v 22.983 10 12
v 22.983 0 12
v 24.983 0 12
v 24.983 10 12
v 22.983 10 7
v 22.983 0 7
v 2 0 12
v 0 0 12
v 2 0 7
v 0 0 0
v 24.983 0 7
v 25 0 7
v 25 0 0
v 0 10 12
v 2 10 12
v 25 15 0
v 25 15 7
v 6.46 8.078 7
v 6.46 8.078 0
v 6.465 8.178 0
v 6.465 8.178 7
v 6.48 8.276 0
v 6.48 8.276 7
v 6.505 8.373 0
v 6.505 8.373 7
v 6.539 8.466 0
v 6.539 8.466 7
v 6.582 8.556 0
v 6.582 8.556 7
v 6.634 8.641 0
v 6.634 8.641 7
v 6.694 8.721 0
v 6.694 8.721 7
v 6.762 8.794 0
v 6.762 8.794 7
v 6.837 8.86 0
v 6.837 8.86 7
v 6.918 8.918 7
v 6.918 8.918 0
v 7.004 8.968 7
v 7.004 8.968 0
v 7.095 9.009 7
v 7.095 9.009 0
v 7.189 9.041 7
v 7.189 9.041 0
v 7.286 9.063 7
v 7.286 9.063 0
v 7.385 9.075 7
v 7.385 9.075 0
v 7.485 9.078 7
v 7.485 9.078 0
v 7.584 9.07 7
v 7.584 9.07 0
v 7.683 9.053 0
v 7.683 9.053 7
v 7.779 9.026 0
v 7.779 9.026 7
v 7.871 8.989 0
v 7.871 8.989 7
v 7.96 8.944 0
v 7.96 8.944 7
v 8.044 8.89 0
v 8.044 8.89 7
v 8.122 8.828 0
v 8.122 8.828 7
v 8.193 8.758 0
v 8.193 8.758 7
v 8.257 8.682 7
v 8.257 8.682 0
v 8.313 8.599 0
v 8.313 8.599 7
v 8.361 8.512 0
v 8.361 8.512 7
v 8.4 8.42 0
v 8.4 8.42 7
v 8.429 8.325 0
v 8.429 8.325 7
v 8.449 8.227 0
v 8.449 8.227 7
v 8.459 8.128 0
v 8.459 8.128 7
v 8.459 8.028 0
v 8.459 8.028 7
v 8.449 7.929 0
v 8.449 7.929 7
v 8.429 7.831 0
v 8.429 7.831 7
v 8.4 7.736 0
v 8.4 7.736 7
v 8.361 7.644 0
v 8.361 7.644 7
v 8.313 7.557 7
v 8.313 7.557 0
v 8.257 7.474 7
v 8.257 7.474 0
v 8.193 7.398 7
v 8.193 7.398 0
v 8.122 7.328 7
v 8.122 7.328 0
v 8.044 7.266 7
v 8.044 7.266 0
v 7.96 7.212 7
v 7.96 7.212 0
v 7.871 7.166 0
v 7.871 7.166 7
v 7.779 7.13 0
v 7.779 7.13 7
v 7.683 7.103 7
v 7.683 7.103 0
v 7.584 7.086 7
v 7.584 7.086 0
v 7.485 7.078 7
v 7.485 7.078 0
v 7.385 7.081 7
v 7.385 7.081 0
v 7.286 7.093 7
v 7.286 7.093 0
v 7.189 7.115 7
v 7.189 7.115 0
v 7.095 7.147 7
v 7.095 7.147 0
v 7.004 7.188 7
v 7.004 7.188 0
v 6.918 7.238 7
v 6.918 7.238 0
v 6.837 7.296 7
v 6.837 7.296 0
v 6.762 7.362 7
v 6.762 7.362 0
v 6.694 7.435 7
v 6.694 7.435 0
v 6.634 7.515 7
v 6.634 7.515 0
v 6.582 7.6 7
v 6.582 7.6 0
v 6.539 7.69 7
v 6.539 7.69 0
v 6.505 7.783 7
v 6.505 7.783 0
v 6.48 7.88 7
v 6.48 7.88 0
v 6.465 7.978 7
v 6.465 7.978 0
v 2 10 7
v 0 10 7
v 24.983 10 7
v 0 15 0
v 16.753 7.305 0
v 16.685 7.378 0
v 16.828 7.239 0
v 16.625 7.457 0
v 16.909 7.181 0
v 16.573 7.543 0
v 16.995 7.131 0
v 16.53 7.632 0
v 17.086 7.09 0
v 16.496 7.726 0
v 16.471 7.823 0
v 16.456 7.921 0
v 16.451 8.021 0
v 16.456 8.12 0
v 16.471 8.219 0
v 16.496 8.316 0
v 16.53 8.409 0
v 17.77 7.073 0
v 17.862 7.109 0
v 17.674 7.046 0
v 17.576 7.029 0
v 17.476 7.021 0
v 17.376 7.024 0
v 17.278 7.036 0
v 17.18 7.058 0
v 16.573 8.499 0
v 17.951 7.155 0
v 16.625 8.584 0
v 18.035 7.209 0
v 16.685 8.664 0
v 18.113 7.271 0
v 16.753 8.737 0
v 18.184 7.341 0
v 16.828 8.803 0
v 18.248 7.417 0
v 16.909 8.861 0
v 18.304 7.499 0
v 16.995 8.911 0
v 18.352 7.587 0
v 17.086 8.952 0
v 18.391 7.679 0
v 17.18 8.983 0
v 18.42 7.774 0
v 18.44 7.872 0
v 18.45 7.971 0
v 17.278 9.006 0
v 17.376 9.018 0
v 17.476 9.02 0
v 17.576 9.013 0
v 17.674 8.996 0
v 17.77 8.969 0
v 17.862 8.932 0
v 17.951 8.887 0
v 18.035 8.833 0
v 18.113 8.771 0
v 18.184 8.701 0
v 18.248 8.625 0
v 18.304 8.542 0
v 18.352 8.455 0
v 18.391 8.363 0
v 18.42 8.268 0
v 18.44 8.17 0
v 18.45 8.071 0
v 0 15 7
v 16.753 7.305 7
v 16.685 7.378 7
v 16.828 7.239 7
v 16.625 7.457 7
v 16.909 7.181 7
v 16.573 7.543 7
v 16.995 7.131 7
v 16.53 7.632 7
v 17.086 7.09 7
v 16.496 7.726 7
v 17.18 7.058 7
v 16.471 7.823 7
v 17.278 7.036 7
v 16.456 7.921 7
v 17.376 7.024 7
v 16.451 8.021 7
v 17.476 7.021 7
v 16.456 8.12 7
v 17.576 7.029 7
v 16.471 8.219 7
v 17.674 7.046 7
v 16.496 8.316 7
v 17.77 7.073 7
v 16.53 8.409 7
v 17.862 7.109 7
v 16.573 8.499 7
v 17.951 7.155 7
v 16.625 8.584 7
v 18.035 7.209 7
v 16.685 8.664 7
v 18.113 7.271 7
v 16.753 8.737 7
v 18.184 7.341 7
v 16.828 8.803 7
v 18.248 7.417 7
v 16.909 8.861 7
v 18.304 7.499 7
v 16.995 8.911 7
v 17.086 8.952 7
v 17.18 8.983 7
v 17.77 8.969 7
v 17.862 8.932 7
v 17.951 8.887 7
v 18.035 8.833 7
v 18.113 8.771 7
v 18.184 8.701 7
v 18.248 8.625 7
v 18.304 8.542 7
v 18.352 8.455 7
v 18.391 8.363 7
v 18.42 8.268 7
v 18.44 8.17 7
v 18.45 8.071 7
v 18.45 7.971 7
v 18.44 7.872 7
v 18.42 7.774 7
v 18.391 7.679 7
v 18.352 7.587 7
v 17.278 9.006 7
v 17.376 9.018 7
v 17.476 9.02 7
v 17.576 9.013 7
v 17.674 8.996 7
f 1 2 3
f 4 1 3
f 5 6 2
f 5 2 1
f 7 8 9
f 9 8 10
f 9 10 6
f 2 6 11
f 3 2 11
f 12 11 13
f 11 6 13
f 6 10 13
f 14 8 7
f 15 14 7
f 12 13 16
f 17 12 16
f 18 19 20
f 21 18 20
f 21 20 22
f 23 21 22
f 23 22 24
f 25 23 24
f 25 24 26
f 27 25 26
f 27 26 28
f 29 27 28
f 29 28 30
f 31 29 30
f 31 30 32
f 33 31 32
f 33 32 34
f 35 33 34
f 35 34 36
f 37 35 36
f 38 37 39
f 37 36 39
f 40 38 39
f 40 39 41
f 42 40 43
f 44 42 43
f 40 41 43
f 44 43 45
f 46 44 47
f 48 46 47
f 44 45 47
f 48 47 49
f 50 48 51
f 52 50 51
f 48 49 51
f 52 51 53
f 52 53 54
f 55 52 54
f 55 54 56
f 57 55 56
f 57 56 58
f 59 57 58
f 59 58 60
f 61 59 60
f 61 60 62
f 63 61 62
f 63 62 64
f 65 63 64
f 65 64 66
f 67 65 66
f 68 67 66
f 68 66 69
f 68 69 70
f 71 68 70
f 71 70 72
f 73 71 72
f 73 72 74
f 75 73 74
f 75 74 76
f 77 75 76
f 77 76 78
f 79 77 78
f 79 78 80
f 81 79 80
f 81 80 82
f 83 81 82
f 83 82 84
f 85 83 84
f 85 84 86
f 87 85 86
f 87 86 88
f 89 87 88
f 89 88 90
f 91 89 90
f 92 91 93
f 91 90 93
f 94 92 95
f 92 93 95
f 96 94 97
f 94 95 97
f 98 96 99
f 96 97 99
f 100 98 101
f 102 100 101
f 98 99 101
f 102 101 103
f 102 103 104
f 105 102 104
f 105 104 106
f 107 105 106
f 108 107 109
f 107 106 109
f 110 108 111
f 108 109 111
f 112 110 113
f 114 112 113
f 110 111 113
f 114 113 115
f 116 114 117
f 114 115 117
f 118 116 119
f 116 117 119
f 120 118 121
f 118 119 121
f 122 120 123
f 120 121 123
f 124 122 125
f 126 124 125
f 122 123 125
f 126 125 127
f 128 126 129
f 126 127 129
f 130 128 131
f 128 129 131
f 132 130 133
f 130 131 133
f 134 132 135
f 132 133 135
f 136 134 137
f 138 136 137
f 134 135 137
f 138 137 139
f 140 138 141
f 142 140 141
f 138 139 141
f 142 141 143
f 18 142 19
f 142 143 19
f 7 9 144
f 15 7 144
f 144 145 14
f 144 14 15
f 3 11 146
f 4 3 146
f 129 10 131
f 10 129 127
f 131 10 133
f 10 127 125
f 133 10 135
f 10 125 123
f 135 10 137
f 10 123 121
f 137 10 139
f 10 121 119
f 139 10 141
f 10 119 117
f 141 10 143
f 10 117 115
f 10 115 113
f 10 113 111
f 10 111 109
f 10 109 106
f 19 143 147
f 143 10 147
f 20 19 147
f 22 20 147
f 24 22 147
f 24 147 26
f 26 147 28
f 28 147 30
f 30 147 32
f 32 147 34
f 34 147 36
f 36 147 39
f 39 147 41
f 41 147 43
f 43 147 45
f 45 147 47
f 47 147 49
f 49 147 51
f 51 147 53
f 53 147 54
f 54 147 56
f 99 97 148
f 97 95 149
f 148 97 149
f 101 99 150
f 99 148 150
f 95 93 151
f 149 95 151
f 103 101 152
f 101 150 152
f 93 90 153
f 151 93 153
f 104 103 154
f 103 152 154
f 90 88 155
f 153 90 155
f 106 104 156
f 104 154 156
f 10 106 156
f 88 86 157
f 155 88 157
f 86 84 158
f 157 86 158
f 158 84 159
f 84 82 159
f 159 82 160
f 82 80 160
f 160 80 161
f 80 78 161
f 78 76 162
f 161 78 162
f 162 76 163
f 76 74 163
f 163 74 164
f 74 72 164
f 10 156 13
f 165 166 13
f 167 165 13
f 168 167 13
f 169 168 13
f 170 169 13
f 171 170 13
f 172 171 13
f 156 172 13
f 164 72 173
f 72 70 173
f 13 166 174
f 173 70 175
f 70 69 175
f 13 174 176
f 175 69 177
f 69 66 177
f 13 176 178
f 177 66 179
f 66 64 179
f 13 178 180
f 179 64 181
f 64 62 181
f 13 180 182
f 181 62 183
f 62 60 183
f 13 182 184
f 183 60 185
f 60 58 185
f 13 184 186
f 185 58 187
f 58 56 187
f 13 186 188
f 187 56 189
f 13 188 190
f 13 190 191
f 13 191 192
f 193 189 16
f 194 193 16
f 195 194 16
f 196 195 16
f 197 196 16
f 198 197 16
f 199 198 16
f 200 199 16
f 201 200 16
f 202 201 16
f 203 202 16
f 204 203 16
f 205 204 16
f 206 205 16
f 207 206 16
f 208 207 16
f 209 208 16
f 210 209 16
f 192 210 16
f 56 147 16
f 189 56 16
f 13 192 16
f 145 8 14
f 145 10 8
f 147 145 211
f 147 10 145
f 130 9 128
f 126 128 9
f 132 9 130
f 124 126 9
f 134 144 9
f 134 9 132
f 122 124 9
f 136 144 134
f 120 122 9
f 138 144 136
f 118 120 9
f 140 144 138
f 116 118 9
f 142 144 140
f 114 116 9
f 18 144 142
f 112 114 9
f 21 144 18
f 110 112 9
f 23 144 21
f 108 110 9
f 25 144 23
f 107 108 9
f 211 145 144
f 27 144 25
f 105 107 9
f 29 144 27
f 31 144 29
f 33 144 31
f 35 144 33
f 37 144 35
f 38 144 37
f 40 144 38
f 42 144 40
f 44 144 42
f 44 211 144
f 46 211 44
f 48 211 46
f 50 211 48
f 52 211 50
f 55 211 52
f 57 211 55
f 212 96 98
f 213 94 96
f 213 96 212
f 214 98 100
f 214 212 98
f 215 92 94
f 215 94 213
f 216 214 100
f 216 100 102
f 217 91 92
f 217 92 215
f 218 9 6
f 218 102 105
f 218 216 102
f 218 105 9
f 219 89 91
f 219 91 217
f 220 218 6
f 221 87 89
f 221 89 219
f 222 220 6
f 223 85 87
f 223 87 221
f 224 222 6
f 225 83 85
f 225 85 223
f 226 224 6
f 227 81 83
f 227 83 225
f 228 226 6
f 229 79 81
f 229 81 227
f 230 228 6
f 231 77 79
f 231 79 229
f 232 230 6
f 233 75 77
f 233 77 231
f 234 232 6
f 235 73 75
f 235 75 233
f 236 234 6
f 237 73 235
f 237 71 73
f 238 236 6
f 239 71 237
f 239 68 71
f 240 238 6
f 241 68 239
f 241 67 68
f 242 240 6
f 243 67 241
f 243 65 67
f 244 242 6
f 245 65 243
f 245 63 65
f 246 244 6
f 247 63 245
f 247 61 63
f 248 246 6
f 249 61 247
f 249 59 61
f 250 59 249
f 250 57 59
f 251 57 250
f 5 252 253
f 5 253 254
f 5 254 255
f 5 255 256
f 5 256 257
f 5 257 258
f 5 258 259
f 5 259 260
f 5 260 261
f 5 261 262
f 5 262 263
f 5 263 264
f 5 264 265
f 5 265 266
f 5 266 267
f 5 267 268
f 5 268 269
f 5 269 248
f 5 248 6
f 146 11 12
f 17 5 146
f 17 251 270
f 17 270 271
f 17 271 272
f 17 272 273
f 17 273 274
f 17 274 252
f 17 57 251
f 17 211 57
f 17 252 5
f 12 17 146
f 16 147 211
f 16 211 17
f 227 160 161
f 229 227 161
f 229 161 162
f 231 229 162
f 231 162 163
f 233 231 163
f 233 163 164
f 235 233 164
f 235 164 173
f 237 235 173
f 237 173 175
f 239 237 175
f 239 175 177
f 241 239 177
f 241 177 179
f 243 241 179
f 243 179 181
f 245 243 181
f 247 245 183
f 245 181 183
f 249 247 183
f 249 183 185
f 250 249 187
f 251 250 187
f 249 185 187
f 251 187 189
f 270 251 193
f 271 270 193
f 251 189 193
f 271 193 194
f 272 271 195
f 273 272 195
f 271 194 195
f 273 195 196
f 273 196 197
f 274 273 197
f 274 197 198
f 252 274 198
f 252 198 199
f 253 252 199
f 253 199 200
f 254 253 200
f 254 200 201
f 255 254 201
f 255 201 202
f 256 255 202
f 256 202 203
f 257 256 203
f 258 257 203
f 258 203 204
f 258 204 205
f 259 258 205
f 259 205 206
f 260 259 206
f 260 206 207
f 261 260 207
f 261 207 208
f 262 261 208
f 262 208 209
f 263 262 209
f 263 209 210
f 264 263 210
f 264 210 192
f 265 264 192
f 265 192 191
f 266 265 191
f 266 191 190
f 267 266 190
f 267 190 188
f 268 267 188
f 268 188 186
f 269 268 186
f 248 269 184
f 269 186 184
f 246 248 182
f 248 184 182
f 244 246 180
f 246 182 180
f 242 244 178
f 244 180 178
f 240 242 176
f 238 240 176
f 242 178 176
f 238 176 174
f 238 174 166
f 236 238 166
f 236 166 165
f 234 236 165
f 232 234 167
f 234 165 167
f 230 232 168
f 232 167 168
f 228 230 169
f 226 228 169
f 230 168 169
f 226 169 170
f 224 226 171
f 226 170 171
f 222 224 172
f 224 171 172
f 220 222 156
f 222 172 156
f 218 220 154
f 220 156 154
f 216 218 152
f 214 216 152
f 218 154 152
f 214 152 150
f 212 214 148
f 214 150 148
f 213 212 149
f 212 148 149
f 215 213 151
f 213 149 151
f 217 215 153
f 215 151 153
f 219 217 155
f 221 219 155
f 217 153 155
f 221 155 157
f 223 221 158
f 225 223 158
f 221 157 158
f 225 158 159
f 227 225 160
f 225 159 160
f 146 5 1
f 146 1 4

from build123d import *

# Parameters (mm, degrees)
F0_W     = 25
F0_H     = 15
F1_DEPTH = 7
F3_W     = 2
F3_H     = 10
F4_DEPTH = 5
F5_W     = 2
F5_H     = 10
F6_DEPTH = 5
F9_D     = 2


with BuildPart() as f1:
    # F0 (on Top) → F1 (new body)
    with BuildSketch(Plane.XY):
        with Locations((12.5, 7.5)):
            Rectangle(F0_W, F0_H)
    extrude(amount=F1_DEPTH)

    # F3 (on face) → F4 (join)
    with BuildSketch(Plane.XY.offset(7)):
        with Locations((1, 5)):
            Rectangle(F3_W, F3_H)
    extrude(amount=F4_DEPTH)

    # F5 (on face) → F6 (join)
    with BuildSketch(Plane.XY.offset(7)):
        with Locations((23.98319, 5)):
            Rectangle(F5_W, F5_H)
    extrude(amount=F6_DEPTH)

    # F9 (through all)
    with Locations(Plane.XY.offset(7)):
        with Locations((7.460146, 8.077994), (17.4512, 8.020776)):
            Hole(F9_D / 2)


solid = f1.part
